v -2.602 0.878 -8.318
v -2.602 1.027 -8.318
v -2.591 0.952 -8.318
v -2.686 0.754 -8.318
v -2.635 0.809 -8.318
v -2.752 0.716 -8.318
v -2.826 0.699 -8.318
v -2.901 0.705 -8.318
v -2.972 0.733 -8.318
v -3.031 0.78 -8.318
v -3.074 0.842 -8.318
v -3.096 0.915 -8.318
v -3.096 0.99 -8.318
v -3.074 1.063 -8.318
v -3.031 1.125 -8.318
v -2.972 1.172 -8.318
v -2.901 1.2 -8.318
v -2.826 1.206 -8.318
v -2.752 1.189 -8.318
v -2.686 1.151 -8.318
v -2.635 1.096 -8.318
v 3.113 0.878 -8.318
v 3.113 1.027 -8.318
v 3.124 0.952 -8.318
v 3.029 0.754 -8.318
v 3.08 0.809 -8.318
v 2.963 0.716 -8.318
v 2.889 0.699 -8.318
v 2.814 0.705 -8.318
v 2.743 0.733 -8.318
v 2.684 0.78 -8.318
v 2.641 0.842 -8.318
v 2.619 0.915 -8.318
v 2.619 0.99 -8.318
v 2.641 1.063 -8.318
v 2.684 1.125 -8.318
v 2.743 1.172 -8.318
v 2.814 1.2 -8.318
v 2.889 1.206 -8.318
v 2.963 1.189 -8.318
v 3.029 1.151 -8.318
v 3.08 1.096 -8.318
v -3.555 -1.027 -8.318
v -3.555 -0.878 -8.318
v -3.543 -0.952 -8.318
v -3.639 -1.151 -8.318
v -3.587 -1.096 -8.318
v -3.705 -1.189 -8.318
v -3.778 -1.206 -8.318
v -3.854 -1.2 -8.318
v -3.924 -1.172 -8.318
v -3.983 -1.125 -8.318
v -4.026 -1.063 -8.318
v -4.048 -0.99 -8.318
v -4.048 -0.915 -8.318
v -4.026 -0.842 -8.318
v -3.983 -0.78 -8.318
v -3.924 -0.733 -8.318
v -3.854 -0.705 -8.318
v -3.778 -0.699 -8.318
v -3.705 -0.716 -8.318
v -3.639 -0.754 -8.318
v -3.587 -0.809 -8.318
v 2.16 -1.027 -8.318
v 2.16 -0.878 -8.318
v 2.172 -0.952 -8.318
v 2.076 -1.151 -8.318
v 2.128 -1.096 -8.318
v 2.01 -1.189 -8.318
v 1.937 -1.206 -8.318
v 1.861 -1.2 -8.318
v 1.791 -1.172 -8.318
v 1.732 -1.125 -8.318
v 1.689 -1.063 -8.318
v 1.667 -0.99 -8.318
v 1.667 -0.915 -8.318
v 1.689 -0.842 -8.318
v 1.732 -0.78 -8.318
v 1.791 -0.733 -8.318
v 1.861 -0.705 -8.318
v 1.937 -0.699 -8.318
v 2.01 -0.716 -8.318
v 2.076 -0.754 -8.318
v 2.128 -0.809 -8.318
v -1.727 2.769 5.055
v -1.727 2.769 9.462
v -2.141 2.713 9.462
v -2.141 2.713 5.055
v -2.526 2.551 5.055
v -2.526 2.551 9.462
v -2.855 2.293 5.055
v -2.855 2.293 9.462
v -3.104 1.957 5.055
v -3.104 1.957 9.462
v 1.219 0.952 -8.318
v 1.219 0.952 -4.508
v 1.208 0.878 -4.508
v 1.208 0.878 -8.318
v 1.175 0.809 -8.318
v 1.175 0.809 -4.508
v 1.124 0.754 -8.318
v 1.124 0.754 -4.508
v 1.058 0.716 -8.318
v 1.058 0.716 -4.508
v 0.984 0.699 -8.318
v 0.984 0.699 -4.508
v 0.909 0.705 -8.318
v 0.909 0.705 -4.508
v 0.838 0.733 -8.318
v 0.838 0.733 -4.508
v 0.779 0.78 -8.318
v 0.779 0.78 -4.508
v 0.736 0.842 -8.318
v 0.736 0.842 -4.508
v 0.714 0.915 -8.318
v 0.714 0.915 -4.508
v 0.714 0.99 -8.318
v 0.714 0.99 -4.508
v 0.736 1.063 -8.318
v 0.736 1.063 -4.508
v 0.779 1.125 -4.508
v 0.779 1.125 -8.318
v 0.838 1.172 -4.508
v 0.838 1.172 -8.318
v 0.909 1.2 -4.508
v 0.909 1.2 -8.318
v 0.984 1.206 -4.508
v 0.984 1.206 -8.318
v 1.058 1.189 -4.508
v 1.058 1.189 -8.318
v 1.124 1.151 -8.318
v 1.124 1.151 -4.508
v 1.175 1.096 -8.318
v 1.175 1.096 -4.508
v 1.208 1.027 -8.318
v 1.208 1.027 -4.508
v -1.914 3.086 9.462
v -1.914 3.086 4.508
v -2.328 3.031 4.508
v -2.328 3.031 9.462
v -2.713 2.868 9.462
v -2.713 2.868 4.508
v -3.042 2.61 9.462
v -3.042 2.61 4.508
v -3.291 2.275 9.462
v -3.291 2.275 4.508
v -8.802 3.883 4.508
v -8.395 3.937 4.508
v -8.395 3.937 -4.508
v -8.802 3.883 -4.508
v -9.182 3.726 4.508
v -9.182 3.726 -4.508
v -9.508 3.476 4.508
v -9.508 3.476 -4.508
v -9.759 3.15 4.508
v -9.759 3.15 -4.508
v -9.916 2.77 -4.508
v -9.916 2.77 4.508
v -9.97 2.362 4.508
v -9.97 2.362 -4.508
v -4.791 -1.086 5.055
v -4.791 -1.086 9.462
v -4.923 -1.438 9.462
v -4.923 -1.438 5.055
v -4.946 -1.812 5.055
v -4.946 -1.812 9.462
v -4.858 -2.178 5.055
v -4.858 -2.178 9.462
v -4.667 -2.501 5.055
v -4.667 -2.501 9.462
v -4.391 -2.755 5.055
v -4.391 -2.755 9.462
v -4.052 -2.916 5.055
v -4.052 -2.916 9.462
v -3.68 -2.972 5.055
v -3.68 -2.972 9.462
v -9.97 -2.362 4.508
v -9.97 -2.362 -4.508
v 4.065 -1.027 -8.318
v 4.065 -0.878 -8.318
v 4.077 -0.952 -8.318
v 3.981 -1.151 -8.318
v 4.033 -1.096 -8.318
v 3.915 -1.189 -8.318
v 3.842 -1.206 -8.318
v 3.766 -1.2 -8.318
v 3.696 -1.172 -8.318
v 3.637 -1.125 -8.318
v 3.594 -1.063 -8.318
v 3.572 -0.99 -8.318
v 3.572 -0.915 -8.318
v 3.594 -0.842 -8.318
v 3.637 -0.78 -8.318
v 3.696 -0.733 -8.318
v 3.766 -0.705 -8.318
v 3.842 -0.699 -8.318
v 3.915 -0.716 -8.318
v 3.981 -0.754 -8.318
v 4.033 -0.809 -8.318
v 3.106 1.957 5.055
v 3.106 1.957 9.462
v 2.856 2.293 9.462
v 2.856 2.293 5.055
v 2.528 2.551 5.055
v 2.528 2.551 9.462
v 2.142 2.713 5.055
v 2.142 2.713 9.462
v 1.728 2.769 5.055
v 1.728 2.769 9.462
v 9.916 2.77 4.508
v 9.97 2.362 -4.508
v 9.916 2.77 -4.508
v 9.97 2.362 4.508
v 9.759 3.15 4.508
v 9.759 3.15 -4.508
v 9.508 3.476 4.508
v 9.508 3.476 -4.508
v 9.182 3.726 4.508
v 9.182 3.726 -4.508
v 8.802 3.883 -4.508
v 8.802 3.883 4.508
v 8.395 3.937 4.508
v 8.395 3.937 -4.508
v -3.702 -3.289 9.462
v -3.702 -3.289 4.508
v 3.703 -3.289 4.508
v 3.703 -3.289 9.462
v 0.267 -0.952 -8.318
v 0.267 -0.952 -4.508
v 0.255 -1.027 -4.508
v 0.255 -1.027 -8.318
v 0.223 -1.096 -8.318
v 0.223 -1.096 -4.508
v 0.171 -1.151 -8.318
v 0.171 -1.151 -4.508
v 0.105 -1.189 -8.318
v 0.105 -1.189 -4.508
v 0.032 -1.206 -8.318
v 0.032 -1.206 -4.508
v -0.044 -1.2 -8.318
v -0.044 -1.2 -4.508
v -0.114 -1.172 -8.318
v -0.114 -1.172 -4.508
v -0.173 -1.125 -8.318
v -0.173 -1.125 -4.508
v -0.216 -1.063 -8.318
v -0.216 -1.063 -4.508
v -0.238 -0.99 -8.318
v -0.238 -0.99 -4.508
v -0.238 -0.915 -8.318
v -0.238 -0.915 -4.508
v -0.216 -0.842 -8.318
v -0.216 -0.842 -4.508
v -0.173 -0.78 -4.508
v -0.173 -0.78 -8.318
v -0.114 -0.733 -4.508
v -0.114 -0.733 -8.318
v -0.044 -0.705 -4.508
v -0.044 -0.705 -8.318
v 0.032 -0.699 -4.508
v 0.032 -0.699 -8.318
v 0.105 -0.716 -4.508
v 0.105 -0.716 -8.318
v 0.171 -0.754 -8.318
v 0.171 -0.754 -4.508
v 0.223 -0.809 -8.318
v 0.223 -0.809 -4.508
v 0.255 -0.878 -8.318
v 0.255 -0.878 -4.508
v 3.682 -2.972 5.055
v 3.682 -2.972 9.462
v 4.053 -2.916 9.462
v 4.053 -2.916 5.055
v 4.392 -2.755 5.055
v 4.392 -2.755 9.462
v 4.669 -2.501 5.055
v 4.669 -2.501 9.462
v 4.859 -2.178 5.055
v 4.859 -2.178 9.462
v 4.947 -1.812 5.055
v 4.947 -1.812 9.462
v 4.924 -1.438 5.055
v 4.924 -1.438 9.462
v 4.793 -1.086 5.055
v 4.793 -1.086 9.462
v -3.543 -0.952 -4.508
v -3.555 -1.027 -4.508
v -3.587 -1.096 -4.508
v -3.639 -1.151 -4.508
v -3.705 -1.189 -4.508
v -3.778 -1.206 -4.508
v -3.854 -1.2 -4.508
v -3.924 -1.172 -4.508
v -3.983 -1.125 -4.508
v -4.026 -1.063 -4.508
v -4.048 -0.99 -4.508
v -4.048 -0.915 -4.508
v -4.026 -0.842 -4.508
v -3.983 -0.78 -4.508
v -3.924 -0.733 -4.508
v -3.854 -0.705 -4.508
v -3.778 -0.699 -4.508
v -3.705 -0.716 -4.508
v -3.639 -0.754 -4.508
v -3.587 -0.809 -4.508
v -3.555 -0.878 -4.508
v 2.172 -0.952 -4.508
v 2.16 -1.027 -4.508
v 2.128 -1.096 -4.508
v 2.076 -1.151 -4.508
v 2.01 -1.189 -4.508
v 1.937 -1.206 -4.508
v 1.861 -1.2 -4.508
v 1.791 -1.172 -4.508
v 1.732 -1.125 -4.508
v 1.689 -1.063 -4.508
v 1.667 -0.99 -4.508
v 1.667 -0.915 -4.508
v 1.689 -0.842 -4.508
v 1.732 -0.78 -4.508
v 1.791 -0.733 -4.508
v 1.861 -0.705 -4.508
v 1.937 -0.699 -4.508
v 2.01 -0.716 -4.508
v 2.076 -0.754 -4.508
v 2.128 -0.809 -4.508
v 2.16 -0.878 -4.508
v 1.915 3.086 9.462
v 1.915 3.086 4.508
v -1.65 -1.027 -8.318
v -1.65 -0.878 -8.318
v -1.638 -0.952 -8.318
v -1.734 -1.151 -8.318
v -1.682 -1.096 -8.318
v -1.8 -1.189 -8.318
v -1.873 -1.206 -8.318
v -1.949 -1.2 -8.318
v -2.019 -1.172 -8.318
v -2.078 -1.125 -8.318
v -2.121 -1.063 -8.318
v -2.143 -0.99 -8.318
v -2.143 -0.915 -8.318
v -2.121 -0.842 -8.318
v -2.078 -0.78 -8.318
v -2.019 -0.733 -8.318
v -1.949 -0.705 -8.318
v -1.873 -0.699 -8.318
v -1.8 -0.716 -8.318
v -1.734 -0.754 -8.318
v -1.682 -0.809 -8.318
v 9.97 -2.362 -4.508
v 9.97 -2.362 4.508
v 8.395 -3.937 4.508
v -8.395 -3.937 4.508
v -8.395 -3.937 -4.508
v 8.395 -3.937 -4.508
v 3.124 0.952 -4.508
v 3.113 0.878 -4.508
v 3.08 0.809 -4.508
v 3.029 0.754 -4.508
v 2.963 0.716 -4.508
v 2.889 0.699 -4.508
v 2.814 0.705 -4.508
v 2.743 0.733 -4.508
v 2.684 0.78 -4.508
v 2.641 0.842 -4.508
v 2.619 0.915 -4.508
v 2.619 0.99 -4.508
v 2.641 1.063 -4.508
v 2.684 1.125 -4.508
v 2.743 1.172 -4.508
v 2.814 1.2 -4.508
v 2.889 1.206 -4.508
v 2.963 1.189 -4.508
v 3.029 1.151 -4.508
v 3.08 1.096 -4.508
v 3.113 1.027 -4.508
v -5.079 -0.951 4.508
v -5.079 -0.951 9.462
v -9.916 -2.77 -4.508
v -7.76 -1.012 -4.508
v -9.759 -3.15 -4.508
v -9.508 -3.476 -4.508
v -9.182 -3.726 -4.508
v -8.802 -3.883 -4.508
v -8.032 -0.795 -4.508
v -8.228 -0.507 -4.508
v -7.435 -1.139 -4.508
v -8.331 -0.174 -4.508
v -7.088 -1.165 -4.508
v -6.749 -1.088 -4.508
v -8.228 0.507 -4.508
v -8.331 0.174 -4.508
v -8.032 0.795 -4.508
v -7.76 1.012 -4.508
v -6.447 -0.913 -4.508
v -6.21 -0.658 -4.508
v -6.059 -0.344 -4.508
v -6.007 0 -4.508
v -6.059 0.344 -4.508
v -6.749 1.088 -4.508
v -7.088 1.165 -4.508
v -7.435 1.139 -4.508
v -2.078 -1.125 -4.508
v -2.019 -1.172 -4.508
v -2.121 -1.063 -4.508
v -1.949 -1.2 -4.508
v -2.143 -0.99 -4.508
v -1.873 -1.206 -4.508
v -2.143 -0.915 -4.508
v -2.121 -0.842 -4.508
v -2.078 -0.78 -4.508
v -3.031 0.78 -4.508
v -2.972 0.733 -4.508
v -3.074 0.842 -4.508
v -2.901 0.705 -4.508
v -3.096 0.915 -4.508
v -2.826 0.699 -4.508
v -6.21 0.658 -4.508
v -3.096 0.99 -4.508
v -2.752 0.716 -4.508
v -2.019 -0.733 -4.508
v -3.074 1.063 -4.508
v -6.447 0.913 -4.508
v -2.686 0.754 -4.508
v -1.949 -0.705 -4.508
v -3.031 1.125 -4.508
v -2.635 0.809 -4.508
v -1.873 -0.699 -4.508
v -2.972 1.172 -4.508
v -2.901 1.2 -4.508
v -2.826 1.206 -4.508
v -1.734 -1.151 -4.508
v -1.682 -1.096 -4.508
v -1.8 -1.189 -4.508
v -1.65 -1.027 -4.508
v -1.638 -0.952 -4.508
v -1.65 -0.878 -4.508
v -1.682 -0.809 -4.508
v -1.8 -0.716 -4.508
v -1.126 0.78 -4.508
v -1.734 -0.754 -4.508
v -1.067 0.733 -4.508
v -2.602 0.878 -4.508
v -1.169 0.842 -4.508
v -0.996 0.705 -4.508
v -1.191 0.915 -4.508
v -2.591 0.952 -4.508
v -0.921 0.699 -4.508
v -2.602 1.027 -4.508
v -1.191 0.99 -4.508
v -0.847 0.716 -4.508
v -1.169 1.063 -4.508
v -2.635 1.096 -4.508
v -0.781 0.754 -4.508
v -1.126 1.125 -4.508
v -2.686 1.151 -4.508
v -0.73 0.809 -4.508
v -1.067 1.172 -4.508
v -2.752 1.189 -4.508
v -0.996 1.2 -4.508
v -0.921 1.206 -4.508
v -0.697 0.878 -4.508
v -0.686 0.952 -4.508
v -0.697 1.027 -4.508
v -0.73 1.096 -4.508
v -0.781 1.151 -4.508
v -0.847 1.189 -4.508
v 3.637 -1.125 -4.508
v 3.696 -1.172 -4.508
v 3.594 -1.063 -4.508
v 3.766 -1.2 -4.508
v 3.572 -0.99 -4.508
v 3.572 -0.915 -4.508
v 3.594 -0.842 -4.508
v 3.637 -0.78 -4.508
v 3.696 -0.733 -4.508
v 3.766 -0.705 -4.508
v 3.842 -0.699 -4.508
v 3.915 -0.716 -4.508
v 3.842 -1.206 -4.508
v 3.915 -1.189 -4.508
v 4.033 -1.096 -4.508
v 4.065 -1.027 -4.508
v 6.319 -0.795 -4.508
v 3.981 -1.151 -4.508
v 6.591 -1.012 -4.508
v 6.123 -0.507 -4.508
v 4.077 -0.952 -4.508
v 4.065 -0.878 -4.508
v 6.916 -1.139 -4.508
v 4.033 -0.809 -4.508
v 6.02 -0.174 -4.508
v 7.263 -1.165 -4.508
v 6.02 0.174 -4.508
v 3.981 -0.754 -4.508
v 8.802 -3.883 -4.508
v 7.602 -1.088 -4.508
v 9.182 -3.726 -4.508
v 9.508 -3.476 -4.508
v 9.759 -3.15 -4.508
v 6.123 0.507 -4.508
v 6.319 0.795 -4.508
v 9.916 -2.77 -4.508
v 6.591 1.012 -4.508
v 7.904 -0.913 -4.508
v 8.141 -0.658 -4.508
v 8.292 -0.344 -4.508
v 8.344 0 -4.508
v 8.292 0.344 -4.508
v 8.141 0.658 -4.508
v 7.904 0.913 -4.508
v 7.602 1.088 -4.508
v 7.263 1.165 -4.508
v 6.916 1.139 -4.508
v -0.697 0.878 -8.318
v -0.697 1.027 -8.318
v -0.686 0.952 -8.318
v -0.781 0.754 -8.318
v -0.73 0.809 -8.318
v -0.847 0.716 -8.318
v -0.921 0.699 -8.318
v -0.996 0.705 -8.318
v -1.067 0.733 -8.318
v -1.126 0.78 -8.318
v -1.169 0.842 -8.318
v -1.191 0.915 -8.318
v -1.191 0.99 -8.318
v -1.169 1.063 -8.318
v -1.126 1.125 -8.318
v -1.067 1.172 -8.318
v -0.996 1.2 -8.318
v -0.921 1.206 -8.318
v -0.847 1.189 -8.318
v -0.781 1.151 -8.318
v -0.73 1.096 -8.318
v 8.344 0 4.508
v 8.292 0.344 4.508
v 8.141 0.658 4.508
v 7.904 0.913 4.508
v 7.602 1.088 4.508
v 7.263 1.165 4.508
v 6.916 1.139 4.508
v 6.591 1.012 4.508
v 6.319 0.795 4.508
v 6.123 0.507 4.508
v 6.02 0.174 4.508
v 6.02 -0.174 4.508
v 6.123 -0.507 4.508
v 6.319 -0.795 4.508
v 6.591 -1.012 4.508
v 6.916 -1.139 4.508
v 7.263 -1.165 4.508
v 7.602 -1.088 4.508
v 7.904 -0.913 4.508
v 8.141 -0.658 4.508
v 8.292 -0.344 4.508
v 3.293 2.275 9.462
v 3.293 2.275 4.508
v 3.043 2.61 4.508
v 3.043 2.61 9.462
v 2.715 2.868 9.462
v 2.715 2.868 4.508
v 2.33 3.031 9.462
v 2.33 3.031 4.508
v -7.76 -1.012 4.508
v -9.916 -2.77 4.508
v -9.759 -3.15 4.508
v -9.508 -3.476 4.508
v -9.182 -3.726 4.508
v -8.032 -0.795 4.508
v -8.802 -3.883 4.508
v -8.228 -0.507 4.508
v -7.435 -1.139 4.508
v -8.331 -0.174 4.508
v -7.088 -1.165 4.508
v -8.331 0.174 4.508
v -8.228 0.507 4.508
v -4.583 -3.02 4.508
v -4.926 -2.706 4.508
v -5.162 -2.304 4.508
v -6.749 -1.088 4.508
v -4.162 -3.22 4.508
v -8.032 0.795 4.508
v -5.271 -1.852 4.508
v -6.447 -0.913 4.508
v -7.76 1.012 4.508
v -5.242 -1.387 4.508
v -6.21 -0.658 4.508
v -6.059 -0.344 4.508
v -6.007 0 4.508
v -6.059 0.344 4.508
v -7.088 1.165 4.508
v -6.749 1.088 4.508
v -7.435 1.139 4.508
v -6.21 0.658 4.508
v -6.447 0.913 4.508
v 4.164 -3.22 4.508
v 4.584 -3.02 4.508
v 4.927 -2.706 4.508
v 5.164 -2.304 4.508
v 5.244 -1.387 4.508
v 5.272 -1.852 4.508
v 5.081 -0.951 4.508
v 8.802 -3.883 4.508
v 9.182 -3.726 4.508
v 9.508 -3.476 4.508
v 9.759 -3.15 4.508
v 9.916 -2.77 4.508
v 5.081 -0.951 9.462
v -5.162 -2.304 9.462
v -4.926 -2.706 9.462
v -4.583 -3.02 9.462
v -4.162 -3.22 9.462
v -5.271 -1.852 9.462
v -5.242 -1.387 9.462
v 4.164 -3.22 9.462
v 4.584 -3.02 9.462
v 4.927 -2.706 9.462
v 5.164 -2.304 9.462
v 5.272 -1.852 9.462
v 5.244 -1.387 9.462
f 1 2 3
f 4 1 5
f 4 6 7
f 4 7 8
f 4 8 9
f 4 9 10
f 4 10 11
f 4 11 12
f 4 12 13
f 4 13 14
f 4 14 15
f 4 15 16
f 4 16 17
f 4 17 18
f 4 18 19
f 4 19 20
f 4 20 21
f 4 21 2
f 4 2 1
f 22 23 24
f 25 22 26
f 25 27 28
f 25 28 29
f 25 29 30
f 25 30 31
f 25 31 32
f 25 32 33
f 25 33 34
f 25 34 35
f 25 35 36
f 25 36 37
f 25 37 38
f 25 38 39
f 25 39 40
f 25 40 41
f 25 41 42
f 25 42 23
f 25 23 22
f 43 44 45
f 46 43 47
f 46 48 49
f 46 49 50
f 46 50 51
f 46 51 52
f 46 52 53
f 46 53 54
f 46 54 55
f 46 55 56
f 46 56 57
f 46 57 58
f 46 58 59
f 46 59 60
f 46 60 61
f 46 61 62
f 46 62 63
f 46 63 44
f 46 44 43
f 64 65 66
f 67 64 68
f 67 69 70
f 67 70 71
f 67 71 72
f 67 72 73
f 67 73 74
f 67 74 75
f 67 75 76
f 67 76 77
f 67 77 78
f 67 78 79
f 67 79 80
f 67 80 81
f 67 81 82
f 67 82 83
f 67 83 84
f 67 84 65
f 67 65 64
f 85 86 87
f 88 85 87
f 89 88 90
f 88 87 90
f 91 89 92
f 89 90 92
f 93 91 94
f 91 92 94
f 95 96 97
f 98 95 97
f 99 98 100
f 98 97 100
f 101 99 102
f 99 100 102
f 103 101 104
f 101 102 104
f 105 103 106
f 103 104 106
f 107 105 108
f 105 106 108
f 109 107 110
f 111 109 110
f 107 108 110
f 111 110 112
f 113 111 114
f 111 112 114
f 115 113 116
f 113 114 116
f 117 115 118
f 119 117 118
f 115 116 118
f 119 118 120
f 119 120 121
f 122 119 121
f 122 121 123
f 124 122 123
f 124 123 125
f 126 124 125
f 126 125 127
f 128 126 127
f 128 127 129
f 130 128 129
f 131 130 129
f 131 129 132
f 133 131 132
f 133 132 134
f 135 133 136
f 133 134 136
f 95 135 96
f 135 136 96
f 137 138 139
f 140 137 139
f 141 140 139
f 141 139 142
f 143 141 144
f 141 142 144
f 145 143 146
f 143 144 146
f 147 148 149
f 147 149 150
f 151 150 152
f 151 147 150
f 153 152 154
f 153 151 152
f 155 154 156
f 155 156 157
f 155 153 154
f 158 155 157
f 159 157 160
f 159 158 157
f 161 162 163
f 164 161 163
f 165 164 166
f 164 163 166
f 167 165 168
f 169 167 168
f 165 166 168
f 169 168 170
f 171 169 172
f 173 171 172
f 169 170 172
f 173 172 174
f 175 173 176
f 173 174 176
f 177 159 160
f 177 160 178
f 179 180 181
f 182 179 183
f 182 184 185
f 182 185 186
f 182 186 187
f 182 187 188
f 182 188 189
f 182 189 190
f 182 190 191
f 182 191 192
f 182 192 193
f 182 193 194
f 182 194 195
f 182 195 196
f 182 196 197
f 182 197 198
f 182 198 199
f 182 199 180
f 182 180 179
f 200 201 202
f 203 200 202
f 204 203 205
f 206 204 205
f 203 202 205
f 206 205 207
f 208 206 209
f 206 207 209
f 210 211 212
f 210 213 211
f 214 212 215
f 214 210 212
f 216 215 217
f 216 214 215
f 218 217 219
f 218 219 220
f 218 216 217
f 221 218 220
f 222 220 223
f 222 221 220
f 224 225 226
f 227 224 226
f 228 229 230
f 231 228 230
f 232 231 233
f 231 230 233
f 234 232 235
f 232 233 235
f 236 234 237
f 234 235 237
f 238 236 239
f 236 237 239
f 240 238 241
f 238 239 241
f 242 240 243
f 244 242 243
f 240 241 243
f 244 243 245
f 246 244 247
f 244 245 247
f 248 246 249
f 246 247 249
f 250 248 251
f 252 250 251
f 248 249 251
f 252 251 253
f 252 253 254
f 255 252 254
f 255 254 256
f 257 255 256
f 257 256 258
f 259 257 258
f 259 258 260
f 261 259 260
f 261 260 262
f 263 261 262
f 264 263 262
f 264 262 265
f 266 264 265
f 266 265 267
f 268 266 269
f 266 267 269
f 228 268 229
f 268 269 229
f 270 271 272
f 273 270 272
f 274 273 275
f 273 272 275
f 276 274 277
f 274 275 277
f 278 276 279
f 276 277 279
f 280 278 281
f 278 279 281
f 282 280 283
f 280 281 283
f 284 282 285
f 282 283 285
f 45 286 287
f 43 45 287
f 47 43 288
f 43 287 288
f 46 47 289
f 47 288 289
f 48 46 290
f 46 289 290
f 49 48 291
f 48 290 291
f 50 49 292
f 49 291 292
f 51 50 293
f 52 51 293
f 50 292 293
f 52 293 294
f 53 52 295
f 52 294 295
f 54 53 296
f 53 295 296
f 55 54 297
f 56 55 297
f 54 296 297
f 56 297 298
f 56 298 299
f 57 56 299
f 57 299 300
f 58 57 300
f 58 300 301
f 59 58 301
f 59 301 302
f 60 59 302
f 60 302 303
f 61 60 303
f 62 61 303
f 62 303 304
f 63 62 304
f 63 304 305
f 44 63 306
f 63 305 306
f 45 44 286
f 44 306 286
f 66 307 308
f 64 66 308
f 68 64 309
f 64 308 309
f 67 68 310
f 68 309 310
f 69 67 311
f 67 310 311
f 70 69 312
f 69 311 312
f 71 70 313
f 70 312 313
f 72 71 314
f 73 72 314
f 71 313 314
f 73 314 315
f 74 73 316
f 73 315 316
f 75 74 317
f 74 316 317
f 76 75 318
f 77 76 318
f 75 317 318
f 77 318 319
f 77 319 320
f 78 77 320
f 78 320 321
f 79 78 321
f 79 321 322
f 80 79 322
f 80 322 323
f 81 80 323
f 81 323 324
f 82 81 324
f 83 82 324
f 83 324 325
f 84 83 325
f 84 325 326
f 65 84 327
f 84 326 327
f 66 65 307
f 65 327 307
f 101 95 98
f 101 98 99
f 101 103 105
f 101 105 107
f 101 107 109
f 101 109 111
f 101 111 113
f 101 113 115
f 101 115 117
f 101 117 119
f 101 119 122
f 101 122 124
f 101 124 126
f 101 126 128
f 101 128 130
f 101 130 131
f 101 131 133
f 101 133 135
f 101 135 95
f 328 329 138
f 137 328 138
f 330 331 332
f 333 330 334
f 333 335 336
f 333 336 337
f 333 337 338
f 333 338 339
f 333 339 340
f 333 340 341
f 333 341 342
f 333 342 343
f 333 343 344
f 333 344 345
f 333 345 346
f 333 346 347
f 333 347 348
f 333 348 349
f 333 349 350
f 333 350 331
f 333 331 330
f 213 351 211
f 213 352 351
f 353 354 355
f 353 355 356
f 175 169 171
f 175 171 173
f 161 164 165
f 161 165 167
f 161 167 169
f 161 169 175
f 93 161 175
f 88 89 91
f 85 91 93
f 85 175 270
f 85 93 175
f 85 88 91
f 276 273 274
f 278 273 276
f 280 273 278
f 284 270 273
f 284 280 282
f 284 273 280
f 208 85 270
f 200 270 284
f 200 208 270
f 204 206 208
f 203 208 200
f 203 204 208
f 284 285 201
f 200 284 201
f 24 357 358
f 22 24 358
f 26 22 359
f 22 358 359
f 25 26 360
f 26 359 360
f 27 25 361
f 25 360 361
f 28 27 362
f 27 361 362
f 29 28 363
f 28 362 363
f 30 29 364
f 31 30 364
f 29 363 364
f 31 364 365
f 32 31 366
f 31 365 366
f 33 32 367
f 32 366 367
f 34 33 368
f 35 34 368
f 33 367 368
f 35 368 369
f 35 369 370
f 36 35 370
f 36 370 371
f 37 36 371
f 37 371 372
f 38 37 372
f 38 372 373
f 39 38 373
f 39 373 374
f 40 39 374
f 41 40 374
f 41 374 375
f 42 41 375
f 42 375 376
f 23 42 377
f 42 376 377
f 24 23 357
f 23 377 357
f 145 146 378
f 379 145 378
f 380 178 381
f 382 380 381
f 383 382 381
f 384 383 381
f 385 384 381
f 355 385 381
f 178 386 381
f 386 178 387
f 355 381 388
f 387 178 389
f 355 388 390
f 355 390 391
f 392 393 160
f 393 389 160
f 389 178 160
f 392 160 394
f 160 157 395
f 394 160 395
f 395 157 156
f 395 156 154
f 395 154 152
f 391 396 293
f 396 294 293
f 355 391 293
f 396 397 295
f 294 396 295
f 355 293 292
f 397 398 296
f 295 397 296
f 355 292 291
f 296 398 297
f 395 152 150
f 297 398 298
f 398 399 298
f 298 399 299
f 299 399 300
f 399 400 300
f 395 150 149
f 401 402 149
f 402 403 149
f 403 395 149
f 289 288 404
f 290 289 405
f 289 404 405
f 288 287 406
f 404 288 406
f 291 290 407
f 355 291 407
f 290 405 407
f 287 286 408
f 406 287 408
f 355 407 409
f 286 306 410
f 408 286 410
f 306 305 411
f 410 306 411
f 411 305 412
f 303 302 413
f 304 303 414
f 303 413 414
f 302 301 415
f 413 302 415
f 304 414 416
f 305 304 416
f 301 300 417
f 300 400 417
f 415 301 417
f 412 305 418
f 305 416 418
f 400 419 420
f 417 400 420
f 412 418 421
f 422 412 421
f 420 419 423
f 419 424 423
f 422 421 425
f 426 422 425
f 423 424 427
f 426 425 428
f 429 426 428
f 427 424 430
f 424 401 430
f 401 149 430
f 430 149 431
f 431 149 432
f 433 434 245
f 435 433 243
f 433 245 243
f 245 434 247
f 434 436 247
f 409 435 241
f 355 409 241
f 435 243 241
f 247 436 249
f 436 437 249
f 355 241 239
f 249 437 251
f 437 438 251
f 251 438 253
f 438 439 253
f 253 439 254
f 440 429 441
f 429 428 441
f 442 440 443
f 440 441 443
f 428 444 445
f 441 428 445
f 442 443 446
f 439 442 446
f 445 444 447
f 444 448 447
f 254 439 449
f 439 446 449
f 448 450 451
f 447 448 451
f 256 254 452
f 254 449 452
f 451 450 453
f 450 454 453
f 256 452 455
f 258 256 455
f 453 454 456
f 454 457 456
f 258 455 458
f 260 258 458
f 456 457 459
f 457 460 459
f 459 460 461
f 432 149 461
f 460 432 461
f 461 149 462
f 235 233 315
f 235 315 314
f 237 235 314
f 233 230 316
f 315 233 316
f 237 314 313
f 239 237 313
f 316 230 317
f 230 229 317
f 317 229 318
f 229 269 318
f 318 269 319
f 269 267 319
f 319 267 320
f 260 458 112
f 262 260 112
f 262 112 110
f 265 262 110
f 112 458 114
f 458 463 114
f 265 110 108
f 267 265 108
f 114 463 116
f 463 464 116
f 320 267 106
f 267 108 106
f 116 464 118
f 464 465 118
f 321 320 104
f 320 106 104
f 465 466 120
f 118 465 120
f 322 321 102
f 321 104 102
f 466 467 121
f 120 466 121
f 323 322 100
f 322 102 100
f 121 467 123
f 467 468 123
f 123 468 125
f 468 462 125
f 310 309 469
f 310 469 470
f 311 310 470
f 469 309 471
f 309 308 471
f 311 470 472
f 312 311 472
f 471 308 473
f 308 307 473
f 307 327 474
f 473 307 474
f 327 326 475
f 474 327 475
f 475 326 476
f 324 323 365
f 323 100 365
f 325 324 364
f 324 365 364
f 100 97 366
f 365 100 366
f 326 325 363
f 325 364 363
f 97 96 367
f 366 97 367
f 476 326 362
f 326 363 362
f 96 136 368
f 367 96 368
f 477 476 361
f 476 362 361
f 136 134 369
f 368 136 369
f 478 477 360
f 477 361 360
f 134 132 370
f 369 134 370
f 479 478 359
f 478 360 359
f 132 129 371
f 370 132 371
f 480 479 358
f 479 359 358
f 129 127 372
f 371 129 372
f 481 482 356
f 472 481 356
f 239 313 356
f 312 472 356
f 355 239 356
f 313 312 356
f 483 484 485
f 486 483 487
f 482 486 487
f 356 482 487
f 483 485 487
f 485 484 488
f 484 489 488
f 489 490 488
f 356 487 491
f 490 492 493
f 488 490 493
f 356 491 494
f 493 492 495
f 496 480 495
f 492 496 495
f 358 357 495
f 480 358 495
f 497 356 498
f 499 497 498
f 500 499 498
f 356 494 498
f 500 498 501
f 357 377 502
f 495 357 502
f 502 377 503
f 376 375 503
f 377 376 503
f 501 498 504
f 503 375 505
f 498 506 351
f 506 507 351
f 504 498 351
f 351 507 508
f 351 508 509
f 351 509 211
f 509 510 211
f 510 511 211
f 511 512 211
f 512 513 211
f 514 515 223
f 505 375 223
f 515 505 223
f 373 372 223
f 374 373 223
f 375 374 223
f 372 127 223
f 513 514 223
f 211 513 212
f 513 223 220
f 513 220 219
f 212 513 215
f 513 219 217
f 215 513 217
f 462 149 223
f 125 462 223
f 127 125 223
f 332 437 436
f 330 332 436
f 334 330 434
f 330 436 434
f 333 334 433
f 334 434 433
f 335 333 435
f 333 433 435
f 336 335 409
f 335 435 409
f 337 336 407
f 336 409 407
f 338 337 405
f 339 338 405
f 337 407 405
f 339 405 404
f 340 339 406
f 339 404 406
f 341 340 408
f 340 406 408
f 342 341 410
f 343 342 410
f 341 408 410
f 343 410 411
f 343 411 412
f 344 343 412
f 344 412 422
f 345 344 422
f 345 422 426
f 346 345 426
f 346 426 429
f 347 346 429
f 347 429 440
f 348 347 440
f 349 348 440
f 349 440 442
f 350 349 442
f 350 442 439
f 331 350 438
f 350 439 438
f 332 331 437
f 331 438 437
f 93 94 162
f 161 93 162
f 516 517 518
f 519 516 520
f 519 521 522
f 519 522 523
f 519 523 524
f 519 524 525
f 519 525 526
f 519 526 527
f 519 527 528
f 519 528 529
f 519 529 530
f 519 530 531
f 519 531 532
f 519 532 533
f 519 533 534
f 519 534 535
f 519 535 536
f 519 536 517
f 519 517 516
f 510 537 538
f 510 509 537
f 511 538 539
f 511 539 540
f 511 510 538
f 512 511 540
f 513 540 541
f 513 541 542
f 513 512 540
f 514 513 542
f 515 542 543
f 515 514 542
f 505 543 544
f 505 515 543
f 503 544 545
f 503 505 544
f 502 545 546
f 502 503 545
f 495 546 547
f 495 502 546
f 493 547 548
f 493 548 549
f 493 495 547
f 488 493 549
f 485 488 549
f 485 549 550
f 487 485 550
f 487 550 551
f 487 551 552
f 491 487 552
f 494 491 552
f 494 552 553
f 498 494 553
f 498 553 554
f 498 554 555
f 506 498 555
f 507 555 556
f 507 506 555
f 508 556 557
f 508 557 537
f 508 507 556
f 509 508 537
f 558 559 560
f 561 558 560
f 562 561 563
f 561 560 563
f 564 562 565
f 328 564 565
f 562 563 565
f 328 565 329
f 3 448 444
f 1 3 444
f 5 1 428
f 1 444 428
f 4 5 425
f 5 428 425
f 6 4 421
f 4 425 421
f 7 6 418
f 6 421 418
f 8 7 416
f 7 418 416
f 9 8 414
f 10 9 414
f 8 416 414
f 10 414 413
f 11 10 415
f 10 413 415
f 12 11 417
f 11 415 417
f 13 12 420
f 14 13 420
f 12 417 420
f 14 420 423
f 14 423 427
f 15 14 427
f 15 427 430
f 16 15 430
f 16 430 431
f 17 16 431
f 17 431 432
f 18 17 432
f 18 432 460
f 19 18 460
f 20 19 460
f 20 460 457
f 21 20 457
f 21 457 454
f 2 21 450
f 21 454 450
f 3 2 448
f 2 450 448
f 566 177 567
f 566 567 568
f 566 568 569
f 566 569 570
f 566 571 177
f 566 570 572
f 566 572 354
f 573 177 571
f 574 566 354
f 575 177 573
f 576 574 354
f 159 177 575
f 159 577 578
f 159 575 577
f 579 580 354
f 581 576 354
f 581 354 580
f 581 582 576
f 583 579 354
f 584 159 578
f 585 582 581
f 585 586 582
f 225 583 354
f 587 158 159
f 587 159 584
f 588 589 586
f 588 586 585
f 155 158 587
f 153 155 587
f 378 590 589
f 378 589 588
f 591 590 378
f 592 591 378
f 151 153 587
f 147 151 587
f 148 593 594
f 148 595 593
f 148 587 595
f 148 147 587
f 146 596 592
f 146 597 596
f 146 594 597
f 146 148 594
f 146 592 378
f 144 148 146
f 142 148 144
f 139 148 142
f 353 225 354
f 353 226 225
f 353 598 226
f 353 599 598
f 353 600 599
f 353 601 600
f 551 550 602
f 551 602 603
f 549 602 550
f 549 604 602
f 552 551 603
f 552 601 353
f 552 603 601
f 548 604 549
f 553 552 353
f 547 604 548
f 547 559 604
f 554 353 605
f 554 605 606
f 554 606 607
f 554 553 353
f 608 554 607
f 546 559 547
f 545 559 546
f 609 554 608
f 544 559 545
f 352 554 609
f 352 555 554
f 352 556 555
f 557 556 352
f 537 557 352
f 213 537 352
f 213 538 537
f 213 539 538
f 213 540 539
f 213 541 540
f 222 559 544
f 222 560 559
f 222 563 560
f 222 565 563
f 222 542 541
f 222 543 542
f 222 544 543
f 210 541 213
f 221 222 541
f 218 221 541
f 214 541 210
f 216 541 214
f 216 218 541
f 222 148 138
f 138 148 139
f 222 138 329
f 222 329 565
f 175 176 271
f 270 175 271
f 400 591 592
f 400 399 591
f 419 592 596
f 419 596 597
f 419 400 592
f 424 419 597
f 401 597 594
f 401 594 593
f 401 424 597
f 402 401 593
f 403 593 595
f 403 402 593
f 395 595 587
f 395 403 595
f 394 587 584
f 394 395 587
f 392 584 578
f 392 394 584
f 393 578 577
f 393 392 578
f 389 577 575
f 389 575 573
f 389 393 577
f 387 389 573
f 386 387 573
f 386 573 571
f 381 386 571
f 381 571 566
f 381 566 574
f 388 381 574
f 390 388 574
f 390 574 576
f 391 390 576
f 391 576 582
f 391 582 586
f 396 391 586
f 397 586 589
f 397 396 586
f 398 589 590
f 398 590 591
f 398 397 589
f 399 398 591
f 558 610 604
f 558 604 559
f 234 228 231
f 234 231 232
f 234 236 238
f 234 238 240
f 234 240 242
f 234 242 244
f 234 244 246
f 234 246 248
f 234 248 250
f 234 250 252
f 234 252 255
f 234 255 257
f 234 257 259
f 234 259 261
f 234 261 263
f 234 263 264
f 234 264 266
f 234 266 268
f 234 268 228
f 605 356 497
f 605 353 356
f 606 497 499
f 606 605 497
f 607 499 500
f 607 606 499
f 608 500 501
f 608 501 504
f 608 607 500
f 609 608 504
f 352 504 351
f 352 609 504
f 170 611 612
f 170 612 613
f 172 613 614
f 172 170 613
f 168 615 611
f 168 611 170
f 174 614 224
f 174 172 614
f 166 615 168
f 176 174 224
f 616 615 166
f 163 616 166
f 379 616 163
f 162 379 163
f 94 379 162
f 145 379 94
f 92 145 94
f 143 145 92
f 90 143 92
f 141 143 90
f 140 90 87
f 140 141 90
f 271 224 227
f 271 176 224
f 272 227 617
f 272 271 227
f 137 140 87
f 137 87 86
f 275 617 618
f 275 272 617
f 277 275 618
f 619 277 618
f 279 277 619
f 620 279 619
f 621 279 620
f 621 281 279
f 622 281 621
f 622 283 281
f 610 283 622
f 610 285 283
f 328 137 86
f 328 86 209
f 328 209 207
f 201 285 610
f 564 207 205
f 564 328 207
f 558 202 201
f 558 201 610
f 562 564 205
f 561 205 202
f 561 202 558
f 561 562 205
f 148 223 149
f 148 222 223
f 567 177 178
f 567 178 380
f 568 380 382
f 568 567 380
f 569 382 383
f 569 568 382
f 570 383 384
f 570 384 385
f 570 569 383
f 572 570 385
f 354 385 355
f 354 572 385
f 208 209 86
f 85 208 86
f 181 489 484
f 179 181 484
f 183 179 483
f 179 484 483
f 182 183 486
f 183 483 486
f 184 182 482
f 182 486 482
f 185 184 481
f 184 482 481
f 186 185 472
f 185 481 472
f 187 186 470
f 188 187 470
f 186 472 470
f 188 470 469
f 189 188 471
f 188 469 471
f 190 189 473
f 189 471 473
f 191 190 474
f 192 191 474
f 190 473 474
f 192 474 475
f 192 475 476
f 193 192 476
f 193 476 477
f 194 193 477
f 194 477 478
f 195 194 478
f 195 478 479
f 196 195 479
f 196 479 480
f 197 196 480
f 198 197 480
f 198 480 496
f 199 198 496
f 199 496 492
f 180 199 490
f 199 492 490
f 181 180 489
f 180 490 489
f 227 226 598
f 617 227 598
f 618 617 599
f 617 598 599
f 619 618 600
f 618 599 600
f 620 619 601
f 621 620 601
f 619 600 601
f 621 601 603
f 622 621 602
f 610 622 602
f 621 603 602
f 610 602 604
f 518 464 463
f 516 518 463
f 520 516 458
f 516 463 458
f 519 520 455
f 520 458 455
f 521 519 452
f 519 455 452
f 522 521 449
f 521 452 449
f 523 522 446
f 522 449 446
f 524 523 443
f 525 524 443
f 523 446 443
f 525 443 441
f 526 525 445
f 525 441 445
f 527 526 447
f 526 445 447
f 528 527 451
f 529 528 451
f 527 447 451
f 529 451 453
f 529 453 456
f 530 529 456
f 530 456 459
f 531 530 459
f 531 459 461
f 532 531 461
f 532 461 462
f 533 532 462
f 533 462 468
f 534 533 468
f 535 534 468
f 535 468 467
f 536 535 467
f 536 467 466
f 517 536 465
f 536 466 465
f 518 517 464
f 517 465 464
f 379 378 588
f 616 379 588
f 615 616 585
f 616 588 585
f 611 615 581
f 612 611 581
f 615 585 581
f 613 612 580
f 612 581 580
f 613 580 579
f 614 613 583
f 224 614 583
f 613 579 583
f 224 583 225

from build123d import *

# Parameters (mm, degrees)
F0_R     = 1.1684
F1_DEPTH = 4.5085
F3_DEPTH = 4.953
F5_DEPTH = 4.4069
F6_R     = 0.254
F7_DEPTH = 3.81


with BuildPart() as f1:
    # F0 (on Top) → F1 (new body, symmetric)
    with BuildSketch(Plane.XY):
        with BuildLine():
            Line((8.3947, 3.937), (-8.3947, 3.937))
            ThreePointArc((-8.3947, 3.937), (-9.508252, 3.475752), (-9.9695, 2.3622))
            Line((-9.9695, 2.3622), (-9.9695, -2.3622))
            ThreePointArc((-9.9695, -2.3622), (-9.508252, -3.475752), (-8.3947, -3.937))
            Line((-8.3947, -3.937), (8.3947, -3.937))
            ThreePointArc((8.3947, -3.937), (9.508252, -3.475752), (9.9695, -2.3622))
            Line((9.9695, -2.3622), (9.9695, 2.3622))
            ThreePointArc((9.9695, 2.3622), (9.508252, 3.475752), (8.3947, 3.937))
        make_face()
        with Locations((-7.1755, 0)):
            Circle(F0_R, mode=Mode.SUBTRACT)
        with Locations((7.1755, 0)):
            Circle(F0_R, mode=Mode.SUBTRACT)
    extrude(amount=F1_DEPTH, both=True)

    # F2 (on face) → F3 (join)
    with BuildSketch(Plane.XY.offset(4.5085)):
        with BuildLine():
            Line((-3.70192, -3.2893), (3.703378, -3.2893))
            ThreePointArc((3.703378, -3.2893), (5.060271, -2.513771), (5.080729, -0.951022))
            Line((5.080729, -0.951022), (3.292639, 2.274778))
            ThreePointArc((3.292639, 2.274778), (2.714559, 2.868194), (1.915288, 3.0861))
            Line((1.915288, 3.0861), (-1.91383, 3.0861))
            ThreePointArc((-1.91383, 3.0861), (-2.713101, 2.868194), (-3.291181, 2.274778))
            Line((-3.291181, 2.274778), (-5.079271, -0.951022))
            ThreePointArc((-5.079271, -0.951022), (-5.058814, -2.513771), (-3.70192, -3.2893))
        make_face()
    extrude(amount=F3_DEPTH)

    # F4 (on face) → F5 (cut)
    with BuildSketch(Plane.XY.offset(9.4615)):
        with BuildLine():
            Line((1.728266, 2.7686), (-1.726808, 2.7686))
            ThreePointArc((-1.726808, 2.7686), (-2.52608, 2.550694), (-3.104159, 1.957278))
            Line((-3.104159, 1.957278), (-4.791127, -1.086092))
            ThreePointArc((-4.791127, -1.086092), (-4.774629, -2.346374), (-3.68036, -2.9718))
            Line((-3.68036, -2.9718), (3.681817, -2.9718))
            ThreePointArc((3.681817, -2.9718), (4.776086, -2.346374), (4.792584, -1.086092))
            Line((4.792584, -1.086092), (3.105617, 1.957278))
            ThreePointArc((3.105617, 1.957278), (2.527537, 2.550694), (1.728266, 2.7686))
        make_face()
    extrude(amount=-F5_DEPTH, mode=Mode.SUBTRACT)

    # F6 (on face) → F7 (join)
    with BuildSketch(Plane(origin=(0, 0, -4.5085), x_dir=(1, 0, 0), z_dir=(0, 0, -1))):
        with Locations((-3.7973, 0.9525)):
            Circle(F6_R)
        with Locations((-1.8923, 0.9525)):
            Circle(F6_R)
        with Locations((0.0127, 0.9525)):
            Circle(F6_R)
        with Locations((1.9177, 0.9525)):
            Circle(F6_R)
        with Locations((3.8227, 0.9525)):
            Circle(F6_R)
        with Locations((-2.8448, -0.9525)):
            Circle(F6_R)
        with Locations((-0.9398, -0.9525)):
            Circle(F6_R)
        with Locations((0.9652, -0.9525)):
            Circle(F6_R)
        with Locations((2.8702, -0.9525)):
            Circle(F6_R)
    extrude(amount=F7_DEPTH)


solid = f1.part
